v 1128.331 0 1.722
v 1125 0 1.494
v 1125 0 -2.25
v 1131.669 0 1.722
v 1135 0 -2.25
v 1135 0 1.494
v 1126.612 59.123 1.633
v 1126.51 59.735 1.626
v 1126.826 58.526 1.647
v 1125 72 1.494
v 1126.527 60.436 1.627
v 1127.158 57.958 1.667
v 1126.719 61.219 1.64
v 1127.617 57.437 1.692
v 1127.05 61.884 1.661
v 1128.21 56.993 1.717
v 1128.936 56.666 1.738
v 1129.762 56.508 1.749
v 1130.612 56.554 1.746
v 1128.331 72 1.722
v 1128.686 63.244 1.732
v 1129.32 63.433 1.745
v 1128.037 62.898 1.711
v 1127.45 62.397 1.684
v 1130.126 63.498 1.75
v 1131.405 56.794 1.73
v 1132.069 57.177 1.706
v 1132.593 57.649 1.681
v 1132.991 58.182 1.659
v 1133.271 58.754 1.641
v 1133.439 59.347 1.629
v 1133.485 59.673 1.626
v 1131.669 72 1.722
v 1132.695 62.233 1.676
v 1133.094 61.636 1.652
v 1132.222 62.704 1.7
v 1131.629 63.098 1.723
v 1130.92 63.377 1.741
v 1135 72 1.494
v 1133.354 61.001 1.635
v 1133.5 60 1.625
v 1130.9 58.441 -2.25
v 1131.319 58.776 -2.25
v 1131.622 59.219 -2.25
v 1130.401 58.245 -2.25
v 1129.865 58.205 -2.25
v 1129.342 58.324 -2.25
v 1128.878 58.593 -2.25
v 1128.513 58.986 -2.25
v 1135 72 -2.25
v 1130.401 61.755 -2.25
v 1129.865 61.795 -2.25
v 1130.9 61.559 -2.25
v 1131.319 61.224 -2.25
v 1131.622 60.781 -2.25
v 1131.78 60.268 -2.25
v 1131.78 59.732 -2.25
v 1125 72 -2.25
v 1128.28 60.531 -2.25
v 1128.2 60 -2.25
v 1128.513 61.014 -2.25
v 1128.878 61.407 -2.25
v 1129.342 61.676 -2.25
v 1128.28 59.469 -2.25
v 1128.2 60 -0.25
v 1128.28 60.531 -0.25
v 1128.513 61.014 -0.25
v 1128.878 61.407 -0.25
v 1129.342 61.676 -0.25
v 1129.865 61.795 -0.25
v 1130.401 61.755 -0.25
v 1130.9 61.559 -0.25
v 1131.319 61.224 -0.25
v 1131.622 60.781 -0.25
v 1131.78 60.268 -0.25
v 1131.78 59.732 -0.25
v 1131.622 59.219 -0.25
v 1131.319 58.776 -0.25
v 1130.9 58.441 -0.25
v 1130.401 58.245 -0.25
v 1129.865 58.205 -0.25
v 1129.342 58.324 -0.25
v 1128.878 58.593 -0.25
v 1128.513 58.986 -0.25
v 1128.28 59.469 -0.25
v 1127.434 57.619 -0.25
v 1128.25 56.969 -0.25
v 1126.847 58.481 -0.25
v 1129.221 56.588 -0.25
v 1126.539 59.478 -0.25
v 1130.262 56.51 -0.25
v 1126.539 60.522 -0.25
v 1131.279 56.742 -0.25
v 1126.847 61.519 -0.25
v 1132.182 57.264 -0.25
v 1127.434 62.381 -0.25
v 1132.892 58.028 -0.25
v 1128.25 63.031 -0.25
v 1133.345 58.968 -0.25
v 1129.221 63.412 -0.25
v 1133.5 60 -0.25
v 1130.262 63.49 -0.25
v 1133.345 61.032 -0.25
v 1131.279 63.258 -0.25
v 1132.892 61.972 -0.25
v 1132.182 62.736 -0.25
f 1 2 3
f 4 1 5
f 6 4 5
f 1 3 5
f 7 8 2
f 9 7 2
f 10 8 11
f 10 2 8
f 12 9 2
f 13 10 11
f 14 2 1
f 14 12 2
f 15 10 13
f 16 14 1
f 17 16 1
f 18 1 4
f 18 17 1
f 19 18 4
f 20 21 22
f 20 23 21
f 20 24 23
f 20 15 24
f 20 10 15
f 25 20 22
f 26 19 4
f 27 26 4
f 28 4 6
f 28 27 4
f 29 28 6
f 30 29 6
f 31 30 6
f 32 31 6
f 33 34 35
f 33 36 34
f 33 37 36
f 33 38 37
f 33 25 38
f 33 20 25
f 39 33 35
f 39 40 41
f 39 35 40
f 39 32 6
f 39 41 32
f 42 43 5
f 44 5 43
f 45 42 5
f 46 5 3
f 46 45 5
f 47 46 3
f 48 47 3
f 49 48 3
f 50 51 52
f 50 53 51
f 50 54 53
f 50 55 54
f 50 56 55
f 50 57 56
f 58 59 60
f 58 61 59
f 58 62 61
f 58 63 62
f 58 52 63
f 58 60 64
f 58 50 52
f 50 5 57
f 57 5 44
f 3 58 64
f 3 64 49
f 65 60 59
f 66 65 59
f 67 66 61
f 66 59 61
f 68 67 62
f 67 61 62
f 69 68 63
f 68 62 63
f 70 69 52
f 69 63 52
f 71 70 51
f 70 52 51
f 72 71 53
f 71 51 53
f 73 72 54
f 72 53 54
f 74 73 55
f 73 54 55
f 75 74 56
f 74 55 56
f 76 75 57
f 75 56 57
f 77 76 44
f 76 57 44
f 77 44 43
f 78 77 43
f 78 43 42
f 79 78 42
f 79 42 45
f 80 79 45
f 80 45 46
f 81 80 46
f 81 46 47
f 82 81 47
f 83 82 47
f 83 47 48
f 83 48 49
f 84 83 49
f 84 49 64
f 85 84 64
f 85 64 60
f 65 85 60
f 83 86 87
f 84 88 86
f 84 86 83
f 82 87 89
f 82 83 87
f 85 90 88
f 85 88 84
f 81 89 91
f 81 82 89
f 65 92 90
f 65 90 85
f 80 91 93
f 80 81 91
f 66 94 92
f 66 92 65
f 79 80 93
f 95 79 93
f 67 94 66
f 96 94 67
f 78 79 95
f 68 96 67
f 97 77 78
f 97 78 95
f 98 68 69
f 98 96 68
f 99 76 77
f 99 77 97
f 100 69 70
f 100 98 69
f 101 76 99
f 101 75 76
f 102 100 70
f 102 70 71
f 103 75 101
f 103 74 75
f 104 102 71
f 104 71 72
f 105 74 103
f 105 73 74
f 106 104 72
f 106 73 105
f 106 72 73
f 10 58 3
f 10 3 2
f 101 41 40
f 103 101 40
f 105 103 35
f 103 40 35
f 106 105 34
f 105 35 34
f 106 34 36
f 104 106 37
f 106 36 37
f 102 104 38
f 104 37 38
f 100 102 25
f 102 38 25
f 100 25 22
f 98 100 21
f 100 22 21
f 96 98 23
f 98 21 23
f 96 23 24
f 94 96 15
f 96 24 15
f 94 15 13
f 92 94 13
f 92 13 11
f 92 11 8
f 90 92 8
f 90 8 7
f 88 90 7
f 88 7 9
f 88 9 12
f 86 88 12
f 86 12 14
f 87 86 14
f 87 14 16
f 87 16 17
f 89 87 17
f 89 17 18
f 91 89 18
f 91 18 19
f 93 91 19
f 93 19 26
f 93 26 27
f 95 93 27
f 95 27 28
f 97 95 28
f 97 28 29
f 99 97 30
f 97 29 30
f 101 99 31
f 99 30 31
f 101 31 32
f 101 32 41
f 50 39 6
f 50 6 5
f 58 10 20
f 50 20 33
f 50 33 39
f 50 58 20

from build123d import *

# Parameters (mm, degrees)
EXTRUDE_1_DEPTH              = 72
HOLE_WIZARD_M3_1_D           = 3.6
HOLE_WIZARD_M3_1_DEPTH       = 4
HOLE_WIZARD_M3_1_CBORE_D     = 7
HOLE_WIZARD_M3_1_CBORE_DEPTH = 2


with BuildPart() as part:
    # 草图1 → 凸台-拉伸1 (new body)
    with BuildSketch(Plane(origin=(0, 72, 0), x_dir=(1, 0, 0), z_dir=(0, 1, 0))):
        with BuildLine():
            Line((1135, -1.494230428), (1135, 2.25))
            Line((1135, 2.25), (1125, 2.25))
            Line((1125, 2.25), (1125, -1.494230428))
            ThreePointArc((1125, -1.494230428), (1130, -1.75), (1135, -1.494230428))
        make_face()
    extrude(amount=-EXTRUDE_1_DEPTH)

    # M3 六角头机械螺钉的柱形沉头孔1
    with Locations(Plane(origin=(1130, 60, 1.75), x_dir=(1, 0, 0), z_dir=(0, 0, 1))):
        with Locations((0, 0)):
            CounterBoreHole(HOLE_WIZARD_M3_1_D / 2, HOLE_WIZARD_M3_1_CBORE_D / 2, HOLE_WIZARD_M3_1_CBORE_DEPTH, depth=HOLE_WIZARD_M3_1_DEPTH)


solid = part.part
